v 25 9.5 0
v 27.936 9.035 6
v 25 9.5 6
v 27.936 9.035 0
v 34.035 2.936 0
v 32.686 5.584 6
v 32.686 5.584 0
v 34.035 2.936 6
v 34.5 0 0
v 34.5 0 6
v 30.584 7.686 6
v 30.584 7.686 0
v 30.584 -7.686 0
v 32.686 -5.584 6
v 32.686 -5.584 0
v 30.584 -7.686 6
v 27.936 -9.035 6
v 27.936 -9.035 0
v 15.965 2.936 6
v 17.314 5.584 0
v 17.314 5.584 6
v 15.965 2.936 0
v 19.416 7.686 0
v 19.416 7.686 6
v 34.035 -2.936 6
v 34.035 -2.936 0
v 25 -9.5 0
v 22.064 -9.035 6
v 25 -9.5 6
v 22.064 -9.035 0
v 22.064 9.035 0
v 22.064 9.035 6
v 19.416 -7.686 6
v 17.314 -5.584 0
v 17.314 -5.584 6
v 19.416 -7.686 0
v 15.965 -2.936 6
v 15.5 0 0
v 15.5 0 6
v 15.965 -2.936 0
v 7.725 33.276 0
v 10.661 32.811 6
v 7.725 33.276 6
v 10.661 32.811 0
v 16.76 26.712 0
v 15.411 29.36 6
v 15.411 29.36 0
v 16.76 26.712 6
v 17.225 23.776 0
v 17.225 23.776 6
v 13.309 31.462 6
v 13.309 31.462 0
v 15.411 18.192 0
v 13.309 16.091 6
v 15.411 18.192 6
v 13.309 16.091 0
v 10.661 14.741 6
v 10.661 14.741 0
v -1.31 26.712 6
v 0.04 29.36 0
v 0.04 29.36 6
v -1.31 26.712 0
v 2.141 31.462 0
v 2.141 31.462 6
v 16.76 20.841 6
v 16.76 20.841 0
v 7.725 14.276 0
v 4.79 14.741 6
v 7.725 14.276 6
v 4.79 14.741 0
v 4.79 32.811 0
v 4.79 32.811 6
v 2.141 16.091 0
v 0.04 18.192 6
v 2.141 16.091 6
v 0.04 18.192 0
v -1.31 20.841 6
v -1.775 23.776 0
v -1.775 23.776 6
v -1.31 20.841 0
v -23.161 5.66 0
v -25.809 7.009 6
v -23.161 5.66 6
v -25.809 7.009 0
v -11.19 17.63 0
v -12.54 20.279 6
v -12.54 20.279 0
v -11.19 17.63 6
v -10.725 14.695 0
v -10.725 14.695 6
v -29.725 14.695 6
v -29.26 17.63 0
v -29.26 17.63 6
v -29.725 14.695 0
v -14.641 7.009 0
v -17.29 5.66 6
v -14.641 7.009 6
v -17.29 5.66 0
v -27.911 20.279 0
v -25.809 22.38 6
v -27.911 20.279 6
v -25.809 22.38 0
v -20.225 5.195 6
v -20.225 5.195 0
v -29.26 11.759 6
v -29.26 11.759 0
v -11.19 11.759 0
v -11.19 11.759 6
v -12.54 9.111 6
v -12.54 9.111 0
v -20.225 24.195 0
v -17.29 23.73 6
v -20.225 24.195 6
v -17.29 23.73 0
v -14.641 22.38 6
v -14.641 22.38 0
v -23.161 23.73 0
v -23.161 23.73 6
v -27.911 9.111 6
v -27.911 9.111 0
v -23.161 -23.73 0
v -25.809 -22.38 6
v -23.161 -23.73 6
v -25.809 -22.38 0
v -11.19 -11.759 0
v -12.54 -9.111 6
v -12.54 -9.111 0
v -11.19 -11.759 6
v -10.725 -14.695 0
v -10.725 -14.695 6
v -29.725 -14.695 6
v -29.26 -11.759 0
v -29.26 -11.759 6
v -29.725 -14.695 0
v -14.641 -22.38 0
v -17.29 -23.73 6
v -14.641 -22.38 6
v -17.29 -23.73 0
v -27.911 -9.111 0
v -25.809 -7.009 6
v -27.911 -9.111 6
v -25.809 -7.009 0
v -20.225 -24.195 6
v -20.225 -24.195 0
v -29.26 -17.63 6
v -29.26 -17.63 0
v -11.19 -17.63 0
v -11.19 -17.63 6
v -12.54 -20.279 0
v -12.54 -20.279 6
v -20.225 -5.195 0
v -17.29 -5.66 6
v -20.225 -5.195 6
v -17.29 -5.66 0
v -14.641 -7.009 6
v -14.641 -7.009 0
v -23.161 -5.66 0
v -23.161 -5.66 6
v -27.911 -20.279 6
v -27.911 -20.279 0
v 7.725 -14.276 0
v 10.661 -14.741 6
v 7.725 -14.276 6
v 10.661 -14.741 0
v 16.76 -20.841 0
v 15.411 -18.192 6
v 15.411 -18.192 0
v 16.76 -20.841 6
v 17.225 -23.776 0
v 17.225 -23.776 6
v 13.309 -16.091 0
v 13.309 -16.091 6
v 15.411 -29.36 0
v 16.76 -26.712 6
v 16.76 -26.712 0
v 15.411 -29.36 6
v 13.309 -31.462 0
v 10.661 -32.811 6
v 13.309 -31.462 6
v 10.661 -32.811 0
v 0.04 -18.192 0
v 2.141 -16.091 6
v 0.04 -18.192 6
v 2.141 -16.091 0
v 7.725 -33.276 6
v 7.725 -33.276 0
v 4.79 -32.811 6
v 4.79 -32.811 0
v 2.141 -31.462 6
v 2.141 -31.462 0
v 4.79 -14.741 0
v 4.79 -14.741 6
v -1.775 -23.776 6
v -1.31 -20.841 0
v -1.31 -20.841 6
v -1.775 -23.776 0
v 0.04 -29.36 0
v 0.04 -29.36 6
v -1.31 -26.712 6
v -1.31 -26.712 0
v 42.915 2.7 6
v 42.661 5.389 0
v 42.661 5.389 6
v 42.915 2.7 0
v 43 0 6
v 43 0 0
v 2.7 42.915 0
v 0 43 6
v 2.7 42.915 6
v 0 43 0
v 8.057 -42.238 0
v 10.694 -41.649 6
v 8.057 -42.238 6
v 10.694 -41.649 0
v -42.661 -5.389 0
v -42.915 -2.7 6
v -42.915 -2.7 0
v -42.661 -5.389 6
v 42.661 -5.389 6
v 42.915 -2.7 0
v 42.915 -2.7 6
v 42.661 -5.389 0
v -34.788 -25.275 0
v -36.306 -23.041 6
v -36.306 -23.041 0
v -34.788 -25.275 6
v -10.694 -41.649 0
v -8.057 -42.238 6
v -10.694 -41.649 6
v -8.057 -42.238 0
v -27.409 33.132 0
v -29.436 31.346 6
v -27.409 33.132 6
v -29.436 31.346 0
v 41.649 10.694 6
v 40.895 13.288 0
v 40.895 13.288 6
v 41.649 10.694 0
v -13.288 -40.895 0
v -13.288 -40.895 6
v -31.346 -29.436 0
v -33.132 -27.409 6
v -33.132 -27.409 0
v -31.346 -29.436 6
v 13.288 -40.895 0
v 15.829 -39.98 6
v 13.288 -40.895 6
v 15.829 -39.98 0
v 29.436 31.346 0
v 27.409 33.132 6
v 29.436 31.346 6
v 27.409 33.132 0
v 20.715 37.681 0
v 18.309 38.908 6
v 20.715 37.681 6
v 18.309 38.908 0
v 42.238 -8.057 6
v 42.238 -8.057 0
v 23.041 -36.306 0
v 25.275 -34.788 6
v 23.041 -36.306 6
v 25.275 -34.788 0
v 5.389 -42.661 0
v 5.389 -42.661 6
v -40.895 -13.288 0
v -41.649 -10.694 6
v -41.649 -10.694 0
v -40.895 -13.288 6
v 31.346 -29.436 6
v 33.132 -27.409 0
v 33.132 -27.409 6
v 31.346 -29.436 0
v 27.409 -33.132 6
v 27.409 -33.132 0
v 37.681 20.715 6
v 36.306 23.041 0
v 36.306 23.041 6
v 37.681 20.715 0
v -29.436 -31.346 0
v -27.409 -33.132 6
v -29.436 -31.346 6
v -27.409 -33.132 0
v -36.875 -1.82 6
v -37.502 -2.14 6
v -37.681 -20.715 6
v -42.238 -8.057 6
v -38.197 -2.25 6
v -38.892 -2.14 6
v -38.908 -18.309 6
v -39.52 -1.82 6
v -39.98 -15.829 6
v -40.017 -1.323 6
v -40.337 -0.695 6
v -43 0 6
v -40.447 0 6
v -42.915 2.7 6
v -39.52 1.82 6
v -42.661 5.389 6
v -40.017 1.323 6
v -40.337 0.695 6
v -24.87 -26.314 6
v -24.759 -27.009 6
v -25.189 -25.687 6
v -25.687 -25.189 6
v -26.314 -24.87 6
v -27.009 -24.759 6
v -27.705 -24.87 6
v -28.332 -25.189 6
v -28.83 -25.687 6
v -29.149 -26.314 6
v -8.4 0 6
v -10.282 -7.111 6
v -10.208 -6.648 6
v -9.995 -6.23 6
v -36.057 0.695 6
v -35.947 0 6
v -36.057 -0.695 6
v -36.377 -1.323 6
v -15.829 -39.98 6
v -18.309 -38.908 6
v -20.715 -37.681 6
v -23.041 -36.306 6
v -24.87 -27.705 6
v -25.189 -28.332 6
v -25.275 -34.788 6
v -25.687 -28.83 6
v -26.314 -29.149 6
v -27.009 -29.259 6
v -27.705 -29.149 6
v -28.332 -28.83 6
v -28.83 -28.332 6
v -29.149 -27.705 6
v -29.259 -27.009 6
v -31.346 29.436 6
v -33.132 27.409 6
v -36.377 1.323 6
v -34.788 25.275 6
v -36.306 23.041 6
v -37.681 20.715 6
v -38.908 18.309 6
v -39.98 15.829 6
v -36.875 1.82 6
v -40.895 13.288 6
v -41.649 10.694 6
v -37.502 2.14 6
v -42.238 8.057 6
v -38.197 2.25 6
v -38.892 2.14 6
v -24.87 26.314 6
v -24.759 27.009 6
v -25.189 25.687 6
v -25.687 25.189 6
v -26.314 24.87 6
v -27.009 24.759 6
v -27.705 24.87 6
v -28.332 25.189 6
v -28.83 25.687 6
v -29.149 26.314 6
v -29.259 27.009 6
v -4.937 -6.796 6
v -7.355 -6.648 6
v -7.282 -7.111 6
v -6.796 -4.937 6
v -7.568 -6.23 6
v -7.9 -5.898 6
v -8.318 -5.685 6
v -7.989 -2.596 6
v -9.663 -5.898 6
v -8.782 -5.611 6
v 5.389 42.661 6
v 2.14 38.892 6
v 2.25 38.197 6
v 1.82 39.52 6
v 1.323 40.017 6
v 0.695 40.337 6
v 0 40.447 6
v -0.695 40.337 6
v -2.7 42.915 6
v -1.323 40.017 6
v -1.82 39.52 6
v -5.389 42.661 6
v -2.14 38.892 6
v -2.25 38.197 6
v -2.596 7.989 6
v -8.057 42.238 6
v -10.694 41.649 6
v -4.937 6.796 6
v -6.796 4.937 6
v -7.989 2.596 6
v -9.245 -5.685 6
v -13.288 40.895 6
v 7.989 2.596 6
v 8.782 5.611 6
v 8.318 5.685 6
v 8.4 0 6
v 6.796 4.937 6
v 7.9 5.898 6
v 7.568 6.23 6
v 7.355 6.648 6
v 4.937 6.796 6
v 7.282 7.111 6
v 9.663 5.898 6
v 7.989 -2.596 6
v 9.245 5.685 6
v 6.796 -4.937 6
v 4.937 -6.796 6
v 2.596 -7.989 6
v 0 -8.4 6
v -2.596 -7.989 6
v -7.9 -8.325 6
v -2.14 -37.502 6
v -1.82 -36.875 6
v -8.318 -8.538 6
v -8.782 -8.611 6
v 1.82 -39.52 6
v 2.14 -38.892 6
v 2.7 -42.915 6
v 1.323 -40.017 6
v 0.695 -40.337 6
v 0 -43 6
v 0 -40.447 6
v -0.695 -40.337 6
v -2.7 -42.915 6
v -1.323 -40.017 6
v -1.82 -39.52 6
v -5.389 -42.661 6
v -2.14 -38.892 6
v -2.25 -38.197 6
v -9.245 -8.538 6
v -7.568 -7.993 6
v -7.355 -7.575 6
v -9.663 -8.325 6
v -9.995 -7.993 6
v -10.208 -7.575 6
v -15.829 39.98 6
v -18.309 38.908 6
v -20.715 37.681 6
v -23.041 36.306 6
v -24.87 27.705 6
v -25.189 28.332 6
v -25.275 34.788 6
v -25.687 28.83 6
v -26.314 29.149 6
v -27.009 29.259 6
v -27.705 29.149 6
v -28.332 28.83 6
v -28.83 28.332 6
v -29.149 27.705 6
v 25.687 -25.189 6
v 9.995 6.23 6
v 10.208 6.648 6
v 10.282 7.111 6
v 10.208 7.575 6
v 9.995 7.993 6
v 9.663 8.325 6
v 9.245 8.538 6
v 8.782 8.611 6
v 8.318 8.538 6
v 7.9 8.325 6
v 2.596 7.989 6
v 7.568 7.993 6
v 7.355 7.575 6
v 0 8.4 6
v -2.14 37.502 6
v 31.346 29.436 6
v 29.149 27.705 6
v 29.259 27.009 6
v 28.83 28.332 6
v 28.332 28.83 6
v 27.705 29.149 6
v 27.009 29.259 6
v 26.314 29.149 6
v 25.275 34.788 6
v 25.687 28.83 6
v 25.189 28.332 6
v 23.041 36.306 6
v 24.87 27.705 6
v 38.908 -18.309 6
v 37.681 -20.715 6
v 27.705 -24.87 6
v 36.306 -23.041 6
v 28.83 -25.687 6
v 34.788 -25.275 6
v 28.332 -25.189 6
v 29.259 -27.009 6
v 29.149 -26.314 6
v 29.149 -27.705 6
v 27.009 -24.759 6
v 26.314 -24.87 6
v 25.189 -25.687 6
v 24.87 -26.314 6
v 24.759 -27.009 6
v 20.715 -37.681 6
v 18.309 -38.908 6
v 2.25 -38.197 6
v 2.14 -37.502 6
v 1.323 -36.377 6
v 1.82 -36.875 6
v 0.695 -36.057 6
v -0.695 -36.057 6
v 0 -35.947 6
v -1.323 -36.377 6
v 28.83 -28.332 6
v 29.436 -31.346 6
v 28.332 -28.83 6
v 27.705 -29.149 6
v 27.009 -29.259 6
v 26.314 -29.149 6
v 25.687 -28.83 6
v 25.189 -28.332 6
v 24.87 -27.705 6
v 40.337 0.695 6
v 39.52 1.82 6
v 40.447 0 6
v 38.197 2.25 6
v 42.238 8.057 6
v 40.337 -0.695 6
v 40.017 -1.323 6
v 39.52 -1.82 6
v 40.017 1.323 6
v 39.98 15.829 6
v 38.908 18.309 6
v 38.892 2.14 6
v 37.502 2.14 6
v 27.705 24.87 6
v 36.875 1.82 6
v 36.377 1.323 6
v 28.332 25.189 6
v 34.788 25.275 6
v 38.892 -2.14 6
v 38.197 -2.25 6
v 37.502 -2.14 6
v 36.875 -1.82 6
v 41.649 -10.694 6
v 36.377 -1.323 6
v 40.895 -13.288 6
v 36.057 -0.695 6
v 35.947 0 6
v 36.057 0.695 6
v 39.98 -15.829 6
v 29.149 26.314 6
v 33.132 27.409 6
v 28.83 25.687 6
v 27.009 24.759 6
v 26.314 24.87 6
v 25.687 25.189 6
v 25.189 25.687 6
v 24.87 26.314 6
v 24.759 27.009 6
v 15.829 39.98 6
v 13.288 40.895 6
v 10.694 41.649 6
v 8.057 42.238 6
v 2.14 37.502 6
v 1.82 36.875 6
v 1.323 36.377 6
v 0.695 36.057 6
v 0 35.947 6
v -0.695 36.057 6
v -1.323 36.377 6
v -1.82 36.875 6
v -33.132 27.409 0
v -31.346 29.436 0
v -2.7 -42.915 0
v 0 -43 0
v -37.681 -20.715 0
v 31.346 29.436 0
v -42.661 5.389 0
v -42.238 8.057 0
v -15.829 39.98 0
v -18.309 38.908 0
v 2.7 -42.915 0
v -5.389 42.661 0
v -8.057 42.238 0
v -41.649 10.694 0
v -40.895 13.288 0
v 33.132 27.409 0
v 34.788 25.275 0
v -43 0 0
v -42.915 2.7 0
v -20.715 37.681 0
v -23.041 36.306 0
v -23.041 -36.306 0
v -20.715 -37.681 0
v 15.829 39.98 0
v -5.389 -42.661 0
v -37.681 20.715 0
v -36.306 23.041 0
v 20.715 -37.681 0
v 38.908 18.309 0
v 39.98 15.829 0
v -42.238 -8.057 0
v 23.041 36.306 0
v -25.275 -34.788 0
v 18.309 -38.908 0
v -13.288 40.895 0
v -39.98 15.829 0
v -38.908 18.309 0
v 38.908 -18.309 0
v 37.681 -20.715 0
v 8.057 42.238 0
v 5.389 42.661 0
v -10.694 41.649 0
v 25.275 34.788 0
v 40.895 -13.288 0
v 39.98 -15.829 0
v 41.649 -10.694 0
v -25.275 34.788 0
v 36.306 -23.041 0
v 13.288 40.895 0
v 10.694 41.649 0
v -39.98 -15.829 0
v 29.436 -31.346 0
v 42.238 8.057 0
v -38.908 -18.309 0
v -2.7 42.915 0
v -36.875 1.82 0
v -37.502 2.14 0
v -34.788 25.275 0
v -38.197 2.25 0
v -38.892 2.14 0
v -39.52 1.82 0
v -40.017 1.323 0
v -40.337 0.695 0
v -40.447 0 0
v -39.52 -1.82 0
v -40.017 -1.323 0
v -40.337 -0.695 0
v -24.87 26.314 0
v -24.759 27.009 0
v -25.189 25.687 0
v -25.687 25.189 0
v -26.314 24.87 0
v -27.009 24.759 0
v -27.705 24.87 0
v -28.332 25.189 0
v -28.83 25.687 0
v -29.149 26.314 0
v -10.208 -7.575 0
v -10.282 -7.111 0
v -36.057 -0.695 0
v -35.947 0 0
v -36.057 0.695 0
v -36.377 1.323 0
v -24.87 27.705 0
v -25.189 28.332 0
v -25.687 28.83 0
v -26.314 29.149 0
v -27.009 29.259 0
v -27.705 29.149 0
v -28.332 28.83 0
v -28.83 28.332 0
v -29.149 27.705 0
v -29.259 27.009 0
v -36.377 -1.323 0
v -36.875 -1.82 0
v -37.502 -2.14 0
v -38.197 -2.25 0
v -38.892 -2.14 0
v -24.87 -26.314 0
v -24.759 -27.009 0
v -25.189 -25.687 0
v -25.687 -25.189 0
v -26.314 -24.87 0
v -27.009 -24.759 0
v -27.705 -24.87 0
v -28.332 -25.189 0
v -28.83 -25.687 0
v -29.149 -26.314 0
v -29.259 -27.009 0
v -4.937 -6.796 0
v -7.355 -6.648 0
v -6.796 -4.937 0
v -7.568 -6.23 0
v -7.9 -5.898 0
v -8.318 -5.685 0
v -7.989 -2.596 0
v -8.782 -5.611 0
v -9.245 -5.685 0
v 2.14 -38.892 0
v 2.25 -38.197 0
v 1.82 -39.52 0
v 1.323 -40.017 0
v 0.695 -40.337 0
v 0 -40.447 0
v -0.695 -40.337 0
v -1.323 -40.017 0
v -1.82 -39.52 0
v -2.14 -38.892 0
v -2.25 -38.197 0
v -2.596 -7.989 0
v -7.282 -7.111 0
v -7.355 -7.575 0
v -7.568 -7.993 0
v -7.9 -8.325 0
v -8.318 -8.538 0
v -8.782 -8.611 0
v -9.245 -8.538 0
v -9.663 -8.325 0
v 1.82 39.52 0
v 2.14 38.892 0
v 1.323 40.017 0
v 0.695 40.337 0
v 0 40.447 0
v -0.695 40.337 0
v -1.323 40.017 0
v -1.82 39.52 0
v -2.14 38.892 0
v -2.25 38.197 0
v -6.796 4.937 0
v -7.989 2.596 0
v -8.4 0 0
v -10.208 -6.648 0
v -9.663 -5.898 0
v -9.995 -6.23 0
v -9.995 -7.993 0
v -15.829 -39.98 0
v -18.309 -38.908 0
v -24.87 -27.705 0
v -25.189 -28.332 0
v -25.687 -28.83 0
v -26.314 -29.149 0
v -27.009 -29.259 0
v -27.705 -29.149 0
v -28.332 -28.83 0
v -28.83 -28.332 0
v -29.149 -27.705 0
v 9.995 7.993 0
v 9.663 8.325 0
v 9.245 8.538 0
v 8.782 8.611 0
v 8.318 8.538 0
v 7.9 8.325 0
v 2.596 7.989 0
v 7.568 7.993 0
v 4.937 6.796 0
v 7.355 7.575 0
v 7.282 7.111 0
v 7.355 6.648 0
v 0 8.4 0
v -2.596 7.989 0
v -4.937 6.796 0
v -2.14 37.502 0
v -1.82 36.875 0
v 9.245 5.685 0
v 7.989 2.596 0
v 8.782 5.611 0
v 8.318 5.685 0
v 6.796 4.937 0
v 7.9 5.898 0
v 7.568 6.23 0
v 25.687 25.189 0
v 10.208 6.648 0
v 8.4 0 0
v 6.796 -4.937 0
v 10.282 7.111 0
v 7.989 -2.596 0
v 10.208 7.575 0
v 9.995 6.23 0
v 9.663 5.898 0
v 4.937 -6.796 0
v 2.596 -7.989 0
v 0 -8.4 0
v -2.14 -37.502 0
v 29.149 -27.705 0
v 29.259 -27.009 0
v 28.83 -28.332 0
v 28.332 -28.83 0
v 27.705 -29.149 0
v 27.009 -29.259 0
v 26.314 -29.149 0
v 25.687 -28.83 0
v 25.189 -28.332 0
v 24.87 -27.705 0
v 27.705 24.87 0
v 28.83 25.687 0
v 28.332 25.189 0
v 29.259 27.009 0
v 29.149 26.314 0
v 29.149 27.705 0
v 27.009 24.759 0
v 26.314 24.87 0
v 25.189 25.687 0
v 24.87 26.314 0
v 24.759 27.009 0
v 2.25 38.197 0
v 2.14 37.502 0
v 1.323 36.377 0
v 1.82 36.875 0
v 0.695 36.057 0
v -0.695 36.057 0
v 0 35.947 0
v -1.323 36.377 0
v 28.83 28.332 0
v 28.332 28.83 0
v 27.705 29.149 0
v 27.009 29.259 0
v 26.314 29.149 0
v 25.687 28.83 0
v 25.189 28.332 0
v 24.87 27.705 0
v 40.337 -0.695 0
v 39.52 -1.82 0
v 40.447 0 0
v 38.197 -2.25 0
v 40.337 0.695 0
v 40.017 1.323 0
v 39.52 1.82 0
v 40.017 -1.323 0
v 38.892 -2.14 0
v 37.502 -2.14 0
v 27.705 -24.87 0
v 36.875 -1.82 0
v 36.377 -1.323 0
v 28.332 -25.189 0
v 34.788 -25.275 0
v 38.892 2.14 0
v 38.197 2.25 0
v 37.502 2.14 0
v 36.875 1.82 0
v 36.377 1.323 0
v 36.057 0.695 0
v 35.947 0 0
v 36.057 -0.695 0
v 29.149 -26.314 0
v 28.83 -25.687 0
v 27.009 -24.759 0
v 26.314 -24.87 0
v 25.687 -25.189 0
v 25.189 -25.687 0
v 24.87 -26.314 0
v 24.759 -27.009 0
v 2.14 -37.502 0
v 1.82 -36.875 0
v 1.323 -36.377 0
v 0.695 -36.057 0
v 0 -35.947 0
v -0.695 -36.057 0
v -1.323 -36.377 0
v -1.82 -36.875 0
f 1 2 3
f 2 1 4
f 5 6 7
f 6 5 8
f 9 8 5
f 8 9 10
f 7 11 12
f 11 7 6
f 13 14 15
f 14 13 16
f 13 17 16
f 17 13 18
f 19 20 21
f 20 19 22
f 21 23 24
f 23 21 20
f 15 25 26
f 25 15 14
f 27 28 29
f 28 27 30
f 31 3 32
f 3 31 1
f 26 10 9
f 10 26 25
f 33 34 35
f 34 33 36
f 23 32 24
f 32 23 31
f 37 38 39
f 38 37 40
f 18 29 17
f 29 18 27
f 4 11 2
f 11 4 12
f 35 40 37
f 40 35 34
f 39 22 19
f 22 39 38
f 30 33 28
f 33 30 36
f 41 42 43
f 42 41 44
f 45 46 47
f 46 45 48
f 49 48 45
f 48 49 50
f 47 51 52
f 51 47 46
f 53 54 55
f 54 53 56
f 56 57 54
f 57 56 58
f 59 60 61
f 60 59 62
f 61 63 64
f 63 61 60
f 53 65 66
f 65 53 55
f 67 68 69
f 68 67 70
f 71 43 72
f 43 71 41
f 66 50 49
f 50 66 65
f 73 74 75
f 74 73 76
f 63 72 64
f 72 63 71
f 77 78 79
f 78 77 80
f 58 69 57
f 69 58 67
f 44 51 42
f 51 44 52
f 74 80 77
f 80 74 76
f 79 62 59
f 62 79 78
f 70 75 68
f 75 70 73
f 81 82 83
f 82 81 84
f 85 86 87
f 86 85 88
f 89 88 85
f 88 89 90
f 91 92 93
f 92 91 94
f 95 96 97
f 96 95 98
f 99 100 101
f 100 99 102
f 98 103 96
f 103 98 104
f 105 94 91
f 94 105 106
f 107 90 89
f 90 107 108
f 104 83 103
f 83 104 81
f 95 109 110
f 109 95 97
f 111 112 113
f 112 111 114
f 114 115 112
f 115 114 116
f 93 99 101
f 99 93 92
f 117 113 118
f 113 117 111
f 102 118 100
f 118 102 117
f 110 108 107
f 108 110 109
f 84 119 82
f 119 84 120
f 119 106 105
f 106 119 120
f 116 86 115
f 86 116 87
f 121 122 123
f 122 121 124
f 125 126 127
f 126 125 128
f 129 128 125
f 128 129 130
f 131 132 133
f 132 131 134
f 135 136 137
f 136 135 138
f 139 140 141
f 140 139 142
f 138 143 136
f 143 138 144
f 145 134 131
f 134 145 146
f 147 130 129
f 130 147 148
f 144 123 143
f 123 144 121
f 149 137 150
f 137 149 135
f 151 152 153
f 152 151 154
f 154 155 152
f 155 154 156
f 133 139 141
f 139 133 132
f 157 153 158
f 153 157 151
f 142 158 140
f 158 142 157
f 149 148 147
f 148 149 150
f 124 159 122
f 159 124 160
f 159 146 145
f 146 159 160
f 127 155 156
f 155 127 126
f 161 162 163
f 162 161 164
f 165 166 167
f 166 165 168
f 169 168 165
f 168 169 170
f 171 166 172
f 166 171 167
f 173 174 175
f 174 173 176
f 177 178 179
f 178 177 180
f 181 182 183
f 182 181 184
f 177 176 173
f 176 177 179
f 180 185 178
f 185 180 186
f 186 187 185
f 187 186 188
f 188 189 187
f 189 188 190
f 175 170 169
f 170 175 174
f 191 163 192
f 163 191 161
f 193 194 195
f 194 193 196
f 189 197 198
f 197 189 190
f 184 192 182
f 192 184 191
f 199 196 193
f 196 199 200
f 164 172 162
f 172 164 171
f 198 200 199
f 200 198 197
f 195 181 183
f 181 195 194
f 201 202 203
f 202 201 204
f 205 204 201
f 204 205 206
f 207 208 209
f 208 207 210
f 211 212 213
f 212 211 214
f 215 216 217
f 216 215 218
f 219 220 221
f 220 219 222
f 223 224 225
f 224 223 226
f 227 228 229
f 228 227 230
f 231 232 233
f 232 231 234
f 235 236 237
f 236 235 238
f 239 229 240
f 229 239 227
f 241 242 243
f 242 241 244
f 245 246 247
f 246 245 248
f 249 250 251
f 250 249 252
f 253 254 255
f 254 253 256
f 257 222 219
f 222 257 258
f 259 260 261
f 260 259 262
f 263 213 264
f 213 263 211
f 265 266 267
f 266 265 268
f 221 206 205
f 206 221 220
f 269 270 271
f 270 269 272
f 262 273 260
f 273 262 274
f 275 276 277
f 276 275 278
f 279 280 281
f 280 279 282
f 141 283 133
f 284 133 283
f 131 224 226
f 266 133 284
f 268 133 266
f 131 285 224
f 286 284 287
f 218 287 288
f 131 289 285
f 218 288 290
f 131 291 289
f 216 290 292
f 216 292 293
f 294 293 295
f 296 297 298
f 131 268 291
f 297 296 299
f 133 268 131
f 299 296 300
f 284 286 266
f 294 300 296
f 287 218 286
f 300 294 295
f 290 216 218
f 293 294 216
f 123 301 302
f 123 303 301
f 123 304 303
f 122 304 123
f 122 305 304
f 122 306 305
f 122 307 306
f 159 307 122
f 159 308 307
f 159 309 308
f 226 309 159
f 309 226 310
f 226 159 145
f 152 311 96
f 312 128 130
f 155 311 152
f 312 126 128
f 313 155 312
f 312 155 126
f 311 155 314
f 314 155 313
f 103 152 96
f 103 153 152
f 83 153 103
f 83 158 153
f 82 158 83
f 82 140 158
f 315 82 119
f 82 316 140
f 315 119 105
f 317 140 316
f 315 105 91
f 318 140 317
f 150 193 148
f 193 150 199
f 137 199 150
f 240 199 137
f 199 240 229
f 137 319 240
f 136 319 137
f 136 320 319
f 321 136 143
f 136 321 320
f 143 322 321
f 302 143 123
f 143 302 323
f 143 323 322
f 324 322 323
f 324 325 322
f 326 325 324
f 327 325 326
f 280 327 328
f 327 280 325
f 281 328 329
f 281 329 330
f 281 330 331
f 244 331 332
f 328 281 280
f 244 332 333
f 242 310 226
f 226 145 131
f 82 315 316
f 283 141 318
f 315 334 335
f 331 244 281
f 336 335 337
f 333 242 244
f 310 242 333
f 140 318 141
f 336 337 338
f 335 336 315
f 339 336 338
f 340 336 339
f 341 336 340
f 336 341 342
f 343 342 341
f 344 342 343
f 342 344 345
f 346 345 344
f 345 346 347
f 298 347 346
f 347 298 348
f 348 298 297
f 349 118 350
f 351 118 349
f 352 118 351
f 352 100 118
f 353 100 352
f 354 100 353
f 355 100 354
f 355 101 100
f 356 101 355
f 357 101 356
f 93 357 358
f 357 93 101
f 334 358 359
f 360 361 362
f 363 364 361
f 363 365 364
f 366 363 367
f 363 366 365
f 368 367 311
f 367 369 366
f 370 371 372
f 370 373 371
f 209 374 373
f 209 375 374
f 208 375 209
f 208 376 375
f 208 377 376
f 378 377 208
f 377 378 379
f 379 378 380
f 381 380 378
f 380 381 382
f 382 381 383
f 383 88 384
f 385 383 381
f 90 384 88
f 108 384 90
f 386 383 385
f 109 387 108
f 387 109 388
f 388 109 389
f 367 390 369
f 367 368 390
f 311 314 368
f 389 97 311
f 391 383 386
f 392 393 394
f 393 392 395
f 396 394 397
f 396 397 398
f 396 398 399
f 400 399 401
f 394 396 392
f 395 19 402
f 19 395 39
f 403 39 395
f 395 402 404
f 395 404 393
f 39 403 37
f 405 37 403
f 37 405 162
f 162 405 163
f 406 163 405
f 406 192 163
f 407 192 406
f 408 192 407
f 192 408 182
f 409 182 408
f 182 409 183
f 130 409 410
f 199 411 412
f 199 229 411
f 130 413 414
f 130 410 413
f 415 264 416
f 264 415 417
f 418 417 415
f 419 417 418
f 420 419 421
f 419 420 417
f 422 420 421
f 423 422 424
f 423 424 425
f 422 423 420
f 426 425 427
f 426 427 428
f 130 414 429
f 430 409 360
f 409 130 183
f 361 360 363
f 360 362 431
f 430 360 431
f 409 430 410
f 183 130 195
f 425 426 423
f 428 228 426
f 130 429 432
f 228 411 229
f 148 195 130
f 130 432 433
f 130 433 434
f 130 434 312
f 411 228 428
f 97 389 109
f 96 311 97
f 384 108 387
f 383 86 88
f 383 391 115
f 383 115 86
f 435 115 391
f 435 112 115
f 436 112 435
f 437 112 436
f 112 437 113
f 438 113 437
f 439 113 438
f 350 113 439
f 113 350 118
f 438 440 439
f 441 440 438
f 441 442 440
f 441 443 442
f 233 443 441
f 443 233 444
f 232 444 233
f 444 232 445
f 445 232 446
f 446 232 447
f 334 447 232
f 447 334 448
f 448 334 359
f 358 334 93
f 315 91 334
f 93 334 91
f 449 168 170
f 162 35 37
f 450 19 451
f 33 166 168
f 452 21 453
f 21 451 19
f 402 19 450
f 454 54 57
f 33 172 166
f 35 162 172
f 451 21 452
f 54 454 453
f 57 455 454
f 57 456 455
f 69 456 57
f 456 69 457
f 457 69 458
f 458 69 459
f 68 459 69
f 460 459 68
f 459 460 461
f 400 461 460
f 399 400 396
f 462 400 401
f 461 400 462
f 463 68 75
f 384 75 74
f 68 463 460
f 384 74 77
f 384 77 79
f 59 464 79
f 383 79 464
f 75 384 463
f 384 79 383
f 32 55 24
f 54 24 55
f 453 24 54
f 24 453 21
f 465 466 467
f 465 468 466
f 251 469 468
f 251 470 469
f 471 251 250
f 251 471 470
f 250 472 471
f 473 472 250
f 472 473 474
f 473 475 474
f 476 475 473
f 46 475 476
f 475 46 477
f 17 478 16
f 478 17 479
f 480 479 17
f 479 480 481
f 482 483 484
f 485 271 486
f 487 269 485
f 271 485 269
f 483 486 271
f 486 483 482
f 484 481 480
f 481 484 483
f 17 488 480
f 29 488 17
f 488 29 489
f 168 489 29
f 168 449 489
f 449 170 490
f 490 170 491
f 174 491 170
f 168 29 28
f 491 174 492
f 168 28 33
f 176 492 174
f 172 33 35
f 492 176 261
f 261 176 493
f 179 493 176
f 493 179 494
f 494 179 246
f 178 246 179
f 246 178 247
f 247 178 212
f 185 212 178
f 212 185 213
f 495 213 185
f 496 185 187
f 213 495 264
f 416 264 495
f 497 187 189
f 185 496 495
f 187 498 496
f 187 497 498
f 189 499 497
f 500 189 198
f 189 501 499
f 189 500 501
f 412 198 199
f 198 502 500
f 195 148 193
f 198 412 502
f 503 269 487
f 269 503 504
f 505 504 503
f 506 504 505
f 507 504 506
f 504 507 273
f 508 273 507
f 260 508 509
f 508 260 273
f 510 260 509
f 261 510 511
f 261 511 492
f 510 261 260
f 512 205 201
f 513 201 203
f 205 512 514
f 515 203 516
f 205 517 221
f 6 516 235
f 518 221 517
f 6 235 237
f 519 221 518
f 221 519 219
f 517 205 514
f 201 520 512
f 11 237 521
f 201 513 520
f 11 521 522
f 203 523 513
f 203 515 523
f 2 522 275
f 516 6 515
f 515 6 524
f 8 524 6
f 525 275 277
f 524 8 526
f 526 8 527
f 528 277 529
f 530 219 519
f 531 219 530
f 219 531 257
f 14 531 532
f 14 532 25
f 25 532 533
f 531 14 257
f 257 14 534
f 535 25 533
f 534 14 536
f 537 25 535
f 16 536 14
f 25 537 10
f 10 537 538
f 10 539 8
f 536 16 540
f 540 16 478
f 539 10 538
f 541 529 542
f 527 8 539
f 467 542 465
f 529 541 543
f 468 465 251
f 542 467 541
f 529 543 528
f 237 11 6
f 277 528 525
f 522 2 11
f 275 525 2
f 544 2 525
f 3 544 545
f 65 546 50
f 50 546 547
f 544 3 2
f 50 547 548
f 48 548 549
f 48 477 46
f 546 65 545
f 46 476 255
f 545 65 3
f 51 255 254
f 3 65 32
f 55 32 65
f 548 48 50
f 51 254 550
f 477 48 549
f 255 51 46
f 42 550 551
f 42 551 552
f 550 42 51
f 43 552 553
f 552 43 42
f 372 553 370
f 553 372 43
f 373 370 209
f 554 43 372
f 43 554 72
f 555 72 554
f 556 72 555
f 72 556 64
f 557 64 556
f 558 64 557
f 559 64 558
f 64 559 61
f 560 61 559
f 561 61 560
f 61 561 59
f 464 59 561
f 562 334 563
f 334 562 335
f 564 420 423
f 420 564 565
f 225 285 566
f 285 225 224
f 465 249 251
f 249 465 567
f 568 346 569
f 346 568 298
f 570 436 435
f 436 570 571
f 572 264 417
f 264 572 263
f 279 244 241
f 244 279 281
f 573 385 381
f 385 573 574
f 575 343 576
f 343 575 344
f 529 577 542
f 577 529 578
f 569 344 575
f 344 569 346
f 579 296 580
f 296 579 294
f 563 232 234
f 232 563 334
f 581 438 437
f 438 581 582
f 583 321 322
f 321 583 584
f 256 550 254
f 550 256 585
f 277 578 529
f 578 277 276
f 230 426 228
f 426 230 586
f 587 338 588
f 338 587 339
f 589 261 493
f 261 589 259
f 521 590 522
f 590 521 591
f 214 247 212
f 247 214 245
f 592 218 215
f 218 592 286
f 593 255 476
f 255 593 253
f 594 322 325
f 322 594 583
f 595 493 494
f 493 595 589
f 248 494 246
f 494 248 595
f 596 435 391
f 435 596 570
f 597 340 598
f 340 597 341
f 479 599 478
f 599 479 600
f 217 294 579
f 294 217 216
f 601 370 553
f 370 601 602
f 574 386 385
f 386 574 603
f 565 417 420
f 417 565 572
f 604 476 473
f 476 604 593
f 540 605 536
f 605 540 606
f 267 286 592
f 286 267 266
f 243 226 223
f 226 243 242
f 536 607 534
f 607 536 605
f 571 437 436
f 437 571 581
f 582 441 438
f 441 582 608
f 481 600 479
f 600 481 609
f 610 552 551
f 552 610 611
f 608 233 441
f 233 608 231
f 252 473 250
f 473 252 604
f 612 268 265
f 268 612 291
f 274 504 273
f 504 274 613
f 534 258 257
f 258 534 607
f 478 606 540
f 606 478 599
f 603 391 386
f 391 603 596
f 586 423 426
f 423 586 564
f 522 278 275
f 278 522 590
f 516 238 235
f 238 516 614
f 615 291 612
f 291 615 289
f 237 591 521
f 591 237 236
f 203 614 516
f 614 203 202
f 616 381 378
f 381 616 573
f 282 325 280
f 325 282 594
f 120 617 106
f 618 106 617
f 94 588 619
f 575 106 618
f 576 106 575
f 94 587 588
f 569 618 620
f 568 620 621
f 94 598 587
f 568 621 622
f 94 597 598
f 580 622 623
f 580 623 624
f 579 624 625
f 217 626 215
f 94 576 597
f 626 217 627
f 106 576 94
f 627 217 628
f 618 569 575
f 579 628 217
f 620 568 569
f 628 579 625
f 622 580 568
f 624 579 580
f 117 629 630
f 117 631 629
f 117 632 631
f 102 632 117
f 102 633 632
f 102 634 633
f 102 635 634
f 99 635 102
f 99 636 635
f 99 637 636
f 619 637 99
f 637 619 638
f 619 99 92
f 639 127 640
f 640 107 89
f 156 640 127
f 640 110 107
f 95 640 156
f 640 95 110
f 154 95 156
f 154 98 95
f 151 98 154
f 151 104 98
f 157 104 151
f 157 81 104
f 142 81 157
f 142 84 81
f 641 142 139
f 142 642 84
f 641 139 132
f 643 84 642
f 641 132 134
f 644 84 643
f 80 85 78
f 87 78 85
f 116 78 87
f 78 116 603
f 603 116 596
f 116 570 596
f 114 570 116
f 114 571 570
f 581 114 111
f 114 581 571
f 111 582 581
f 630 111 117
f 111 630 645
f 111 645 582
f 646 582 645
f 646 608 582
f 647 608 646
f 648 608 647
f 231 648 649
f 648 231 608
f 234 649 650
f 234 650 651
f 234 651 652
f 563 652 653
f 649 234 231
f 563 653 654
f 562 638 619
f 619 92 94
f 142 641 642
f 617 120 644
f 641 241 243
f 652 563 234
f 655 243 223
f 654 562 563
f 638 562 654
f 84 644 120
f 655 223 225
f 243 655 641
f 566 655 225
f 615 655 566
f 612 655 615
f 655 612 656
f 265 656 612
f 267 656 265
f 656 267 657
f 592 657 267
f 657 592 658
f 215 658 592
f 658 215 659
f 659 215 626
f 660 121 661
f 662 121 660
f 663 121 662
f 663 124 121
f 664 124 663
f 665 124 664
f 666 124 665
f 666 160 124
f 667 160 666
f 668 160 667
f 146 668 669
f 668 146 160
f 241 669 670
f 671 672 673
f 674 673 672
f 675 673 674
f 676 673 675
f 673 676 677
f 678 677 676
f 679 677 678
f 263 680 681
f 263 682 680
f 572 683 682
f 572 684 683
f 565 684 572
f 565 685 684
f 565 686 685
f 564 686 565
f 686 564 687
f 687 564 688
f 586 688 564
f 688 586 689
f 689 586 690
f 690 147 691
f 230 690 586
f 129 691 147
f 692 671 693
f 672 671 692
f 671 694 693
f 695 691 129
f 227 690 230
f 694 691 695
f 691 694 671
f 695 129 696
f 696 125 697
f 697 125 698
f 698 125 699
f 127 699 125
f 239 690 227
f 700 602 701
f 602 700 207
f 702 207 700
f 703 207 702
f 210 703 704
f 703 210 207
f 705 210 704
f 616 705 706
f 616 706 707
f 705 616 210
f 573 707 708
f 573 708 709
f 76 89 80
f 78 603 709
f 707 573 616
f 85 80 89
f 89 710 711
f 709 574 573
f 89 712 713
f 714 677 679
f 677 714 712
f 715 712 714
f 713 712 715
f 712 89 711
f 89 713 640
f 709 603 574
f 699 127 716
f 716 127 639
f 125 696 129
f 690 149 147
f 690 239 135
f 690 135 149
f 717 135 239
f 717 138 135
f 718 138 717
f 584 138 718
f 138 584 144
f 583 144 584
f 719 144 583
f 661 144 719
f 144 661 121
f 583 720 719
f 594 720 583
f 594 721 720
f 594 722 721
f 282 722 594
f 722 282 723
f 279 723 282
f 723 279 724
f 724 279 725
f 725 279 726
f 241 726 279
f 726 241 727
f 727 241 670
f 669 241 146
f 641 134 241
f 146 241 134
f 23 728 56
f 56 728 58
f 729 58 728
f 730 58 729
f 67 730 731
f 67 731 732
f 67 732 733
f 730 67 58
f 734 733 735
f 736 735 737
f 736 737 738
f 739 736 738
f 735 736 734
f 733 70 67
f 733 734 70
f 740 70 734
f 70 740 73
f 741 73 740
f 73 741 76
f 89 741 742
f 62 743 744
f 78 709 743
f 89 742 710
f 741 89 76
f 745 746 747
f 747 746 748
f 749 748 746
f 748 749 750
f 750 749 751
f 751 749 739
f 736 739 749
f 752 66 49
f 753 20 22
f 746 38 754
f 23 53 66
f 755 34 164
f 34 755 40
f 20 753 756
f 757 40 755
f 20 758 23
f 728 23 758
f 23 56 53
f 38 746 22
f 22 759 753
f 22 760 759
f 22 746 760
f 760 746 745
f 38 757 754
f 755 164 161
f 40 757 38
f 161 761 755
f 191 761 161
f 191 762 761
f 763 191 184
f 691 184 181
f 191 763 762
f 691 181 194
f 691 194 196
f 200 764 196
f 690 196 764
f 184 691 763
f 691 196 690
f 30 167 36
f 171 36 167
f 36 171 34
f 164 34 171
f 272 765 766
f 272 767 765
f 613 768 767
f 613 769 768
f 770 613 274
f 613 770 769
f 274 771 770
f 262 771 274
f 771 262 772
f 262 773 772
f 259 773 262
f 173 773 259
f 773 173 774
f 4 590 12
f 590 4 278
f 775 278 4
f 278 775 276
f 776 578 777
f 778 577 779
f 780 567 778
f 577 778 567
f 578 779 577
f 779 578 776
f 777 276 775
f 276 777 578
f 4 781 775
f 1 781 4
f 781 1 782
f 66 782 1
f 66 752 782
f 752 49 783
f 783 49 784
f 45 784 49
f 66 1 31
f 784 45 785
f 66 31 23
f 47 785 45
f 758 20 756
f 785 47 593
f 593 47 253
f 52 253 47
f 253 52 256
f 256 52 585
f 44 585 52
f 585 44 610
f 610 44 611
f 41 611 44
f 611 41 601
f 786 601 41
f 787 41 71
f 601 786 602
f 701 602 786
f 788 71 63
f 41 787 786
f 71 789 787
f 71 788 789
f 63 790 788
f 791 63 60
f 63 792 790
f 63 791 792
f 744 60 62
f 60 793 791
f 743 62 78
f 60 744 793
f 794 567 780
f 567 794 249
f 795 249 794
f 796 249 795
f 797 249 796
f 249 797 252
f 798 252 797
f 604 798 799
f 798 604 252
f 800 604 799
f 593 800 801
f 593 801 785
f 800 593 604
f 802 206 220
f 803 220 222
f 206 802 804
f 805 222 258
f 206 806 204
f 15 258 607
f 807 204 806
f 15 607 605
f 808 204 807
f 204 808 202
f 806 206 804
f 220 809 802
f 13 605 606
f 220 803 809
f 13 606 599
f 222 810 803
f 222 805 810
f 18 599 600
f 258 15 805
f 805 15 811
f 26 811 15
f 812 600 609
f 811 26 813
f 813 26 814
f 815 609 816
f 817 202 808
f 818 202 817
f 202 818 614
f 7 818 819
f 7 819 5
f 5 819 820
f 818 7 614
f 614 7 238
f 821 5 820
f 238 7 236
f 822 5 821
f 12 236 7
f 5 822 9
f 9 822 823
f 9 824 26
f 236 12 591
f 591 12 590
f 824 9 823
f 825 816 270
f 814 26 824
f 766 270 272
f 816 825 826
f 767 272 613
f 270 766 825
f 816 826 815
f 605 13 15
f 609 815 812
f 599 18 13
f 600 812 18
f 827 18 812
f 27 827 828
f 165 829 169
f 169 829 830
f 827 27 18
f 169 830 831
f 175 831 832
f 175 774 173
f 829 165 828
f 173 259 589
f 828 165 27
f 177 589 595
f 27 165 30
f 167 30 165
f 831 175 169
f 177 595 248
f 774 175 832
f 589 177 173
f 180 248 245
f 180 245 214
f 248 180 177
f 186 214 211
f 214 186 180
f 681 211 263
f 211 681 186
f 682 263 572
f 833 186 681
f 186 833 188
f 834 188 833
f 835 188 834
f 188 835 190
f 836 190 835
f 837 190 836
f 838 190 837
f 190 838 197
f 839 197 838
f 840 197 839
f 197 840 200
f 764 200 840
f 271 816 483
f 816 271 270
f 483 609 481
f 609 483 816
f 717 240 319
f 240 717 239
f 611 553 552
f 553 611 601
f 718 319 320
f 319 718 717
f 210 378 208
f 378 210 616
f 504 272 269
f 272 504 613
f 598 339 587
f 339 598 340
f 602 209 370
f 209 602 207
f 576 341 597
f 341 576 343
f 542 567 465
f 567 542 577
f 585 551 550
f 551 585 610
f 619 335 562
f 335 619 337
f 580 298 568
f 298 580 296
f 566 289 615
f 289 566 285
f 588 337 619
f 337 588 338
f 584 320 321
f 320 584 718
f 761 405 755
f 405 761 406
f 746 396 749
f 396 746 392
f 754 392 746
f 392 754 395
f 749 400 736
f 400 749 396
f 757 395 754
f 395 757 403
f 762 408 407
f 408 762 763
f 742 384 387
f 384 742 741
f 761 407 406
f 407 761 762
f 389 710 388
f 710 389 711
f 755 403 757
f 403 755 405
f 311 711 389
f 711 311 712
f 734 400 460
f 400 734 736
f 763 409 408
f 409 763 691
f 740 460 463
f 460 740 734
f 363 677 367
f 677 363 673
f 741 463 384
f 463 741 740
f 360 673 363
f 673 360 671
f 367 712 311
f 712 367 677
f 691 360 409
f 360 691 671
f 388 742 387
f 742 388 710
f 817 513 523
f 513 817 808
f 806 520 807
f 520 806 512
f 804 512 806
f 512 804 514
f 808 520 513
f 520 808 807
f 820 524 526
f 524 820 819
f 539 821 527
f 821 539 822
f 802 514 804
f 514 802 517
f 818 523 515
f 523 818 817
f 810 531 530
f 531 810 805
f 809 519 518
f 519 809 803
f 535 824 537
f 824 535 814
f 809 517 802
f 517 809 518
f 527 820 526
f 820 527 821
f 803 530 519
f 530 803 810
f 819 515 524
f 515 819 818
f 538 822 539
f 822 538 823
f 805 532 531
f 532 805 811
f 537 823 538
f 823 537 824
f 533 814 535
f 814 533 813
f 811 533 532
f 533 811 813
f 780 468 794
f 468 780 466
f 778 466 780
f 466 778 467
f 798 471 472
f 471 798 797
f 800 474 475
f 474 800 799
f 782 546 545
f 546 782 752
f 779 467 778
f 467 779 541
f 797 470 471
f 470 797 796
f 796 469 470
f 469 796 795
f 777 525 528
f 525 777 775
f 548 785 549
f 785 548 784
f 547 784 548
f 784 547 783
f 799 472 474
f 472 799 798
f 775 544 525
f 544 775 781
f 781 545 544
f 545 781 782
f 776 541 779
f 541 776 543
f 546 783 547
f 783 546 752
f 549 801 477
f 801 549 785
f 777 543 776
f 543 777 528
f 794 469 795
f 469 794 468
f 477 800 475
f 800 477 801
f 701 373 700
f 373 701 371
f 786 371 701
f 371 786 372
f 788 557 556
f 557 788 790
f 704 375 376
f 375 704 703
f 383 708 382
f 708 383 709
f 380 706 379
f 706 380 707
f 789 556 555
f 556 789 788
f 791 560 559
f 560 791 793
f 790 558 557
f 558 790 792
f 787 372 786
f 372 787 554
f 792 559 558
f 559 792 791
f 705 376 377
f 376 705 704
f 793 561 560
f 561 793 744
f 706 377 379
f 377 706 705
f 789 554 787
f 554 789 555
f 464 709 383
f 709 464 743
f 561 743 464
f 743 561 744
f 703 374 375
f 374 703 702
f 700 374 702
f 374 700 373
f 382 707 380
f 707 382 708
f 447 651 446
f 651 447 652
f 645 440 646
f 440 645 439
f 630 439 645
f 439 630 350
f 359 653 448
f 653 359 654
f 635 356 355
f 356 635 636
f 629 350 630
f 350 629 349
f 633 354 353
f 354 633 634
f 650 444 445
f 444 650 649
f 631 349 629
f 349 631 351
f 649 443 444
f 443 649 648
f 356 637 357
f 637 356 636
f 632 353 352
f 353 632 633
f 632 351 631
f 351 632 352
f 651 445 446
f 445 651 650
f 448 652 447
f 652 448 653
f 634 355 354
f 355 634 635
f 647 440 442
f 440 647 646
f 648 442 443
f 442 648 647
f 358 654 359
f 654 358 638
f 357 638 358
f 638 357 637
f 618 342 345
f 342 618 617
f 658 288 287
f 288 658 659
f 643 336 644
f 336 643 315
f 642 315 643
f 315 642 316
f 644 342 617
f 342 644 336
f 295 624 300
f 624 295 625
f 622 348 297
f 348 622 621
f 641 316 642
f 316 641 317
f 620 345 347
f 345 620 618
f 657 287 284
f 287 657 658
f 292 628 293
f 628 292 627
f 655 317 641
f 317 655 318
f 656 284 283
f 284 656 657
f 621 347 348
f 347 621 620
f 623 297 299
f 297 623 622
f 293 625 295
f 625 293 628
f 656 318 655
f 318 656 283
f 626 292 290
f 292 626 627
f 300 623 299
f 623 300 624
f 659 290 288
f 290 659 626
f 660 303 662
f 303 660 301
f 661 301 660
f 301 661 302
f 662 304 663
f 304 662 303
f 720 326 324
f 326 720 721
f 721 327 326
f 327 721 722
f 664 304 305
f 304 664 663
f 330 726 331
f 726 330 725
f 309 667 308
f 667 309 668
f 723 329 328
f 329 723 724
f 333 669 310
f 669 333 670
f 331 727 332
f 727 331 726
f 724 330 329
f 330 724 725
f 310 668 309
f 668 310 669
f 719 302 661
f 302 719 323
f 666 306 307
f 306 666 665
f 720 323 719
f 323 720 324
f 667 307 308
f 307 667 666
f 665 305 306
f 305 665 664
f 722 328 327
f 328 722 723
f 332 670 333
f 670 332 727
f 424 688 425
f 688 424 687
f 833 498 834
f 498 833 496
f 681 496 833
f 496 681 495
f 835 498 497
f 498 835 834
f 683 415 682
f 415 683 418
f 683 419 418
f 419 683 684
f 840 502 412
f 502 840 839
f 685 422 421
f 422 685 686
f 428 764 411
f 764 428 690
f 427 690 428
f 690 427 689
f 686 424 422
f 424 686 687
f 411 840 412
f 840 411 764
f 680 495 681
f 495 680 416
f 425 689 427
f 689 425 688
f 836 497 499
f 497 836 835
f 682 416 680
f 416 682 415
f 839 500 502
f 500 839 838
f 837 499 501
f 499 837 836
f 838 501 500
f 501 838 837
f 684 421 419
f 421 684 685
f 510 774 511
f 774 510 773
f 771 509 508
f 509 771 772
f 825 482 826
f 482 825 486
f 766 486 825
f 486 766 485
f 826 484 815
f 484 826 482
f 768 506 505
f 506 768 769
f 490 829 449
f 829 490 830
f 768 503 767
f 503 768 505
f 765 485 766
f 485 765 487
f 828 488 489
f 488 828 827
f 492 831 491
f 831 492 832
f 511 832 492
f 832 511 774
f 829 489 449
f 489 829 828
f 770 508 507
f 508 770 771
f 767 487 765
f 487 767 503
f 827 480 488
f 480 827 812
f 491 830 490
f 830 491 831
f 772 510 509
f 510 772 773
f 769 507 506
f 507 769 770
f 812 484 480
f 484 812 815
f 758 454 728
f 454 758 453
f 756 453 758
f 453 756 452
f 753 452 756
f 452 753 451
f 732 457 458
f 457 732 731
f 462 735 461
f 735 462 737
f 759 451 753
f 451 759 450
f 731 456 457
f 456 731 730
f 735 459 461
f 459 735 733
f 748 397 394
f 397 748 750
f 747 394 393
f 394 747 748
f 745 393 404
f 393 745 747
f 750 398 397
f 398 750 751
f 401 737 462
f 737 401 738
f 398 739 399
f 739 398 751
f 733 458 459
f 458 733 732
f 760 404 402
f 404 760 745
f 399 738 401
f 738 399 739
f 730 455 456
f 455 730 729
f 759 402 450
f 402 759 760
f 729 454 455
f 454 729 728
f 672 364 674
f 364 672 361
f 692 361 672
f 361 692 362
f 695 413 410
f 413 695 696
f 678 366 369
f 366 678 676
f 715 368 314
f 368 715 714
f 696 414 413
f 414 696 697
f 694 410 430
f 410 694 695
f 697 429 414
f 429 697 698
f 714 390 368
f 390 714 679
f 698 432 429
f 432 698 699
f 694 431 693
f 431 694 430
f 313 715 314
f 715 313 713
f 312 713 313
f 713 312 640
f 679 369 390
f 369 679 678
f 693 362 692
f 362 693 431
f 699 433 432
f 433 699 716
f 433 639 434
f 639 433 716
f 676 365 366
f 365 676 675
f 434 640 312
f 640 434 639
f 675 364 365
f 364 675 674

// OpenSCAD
//RUEDA con radios 
//parametros rueda

//medidas del aro externo de la rueda.
diametro=86; //diametro externo de la rueda. influye en la velocidad.
grosor=6;	// grosor del aro externo de la rueda

//medidas de los radios
//grosor_radios=8; //grosor o altura de los radios

//medidas del hub central
grosor_hub=12; //grosor o altura del hub central. minimo grosor_tuerca+1
diam_hub=31;	//diametro del hub
diametro_tuerca=16.8; //diametro mayor, entre picos, de la tuerca
grosor_tuerca=6; //grosor o altura de la tuerca
diam_eje=5;  //eje central por el que pasa el tornillo de izquierdas
diam_eje_motor=9.6; //diametro del eje motor
diam_eje_mandril=12; //diametro del eje del mandril


//medidas de las cadenas
dientes=8; //numero de dientes de la rueda
paso=30; //distacia entre las tuercas o dientes de la cadena

//medidas de los agujeros del hub
tornillohub=2;
pasohub=diametro_tuerca+5.8;
metrica_hub=3;

//exterior (1) interior (2) suplementos(3)
pos_rueda=2;



angulodientes=360/dientes;
distanciadientes=paso*dientes/3.141592;

angulohub=360/tornillohub;
distanciahub=pasohub*tornillohub/3.141592;

module rueda(gros=grosor, diam=diametro, diam_axis=diam_eje,diam_tuerca=diametro_tuerca)
{
	difference(){
		union(){
			difference(){
			//rueda
				
				//parte exterior y radios
				cylinder (r=diam/2, h=gros, $fn=100);
				//translate([0,0,grosor_radios])
				//cylinder (r=(diam-20)/2, h=100, $fn=100);
				//vaciado de radios
				if (pos_rueda!=3){
					for (i=[0:4]) 
					{
					translate([(25)*cos(72*i),(25)*sin(72*i),-1])
					cylinder(r=(38)/4, h=100, $fn=20);
		
					}//fin for
				}
						
			}// fin diference
			//cilindro del hub	
			//si es rueda externa hub alto
			if (pos_rueda==1){
					cylinder (r=diam_hub/2, h=grosor_hub+grosor, $fn=20);
			}
			//si es rueda interna hub bajo
			if (pos_rueda==2){
					cylinder (r=diam_hub/2, h=grosor, $fn=20);
			}
		}// fin union
			if (pos_rueda==1){
				//taladro
				cylinder(r=diam_axis/2, h=80, $fn=30, center=true);
				//tuerca
				translate ([0,0,grosor])
				cylinder(r=diam_tuerca/2, h=grosor+grosor_hub+2, $fn=6);
				//agujero resto hub
				translate ([0,0,grosor+grosor_tuerca])
				cylinder(r=(diam_tuerca+1)/2, h=grosor+grosor_hub+2, $fn=20);
			}
			if (pos_rueda==2){
				//cylinder(r=diam_eje_mandril/2, h=80, $fn=30, center=true);
				//translate ([0,0,grosor-2])
				cylinder(r=(diam_tuerca)/2, h=grosor*5, $fn=20, center=true);
			}
	}//fin diference
}



difference()
//union()
{
	//rueda en si
	rueda();
	//taladros
	for (i=[0:dientes-1]) 
	{
		translate([distanciadientes/2*cos(angulodientes*i),distanciadientes/2*sin(angulodientes*i),0])
		cylinder(r=4.5/2, h=100, $fn=20);
		//translate ([8*cos(angulodientes*i),8*sin(angulodientes*i),grosor])
		//rotate([0,0,angulodientes*i])
		//cube([4,distanciadientes/2,10]);
	}
	//agujeros de union de hub
	for (i=[0:tornillohub-1]) 
	{
		translate([pasohub/2*cos(angulohub*i+39),pasohub/2*sin(angulohub*i+39),0])
		cylinder(r=metrica_hub/2, h=100, $fn=20,center=true);
		//translate ([8*cos(angulodientes*i),8*sin(angulodientes*i),grosor])
		//rotate([0,0,angulodientes*i])
		//cube([4,distanciadientes/2,10]);
	}
	if (pos_rueda==3){
		cylinder(r=(diametro-20)/2, h=20, $fn=50,center=true);	
	}

}

echo("diametro de la rueda   ",diametro);
echo("diametro de los dientes    ",distanciadientes);
echo("separacion entre dientes y borde   ",(diametro-distanciadientes)/2);
echo("Velocidad teorica a 550rpm ", (diametro*3.141592*550/1000000*60));
echo("diametro del hub    ",distanciahub);

	
